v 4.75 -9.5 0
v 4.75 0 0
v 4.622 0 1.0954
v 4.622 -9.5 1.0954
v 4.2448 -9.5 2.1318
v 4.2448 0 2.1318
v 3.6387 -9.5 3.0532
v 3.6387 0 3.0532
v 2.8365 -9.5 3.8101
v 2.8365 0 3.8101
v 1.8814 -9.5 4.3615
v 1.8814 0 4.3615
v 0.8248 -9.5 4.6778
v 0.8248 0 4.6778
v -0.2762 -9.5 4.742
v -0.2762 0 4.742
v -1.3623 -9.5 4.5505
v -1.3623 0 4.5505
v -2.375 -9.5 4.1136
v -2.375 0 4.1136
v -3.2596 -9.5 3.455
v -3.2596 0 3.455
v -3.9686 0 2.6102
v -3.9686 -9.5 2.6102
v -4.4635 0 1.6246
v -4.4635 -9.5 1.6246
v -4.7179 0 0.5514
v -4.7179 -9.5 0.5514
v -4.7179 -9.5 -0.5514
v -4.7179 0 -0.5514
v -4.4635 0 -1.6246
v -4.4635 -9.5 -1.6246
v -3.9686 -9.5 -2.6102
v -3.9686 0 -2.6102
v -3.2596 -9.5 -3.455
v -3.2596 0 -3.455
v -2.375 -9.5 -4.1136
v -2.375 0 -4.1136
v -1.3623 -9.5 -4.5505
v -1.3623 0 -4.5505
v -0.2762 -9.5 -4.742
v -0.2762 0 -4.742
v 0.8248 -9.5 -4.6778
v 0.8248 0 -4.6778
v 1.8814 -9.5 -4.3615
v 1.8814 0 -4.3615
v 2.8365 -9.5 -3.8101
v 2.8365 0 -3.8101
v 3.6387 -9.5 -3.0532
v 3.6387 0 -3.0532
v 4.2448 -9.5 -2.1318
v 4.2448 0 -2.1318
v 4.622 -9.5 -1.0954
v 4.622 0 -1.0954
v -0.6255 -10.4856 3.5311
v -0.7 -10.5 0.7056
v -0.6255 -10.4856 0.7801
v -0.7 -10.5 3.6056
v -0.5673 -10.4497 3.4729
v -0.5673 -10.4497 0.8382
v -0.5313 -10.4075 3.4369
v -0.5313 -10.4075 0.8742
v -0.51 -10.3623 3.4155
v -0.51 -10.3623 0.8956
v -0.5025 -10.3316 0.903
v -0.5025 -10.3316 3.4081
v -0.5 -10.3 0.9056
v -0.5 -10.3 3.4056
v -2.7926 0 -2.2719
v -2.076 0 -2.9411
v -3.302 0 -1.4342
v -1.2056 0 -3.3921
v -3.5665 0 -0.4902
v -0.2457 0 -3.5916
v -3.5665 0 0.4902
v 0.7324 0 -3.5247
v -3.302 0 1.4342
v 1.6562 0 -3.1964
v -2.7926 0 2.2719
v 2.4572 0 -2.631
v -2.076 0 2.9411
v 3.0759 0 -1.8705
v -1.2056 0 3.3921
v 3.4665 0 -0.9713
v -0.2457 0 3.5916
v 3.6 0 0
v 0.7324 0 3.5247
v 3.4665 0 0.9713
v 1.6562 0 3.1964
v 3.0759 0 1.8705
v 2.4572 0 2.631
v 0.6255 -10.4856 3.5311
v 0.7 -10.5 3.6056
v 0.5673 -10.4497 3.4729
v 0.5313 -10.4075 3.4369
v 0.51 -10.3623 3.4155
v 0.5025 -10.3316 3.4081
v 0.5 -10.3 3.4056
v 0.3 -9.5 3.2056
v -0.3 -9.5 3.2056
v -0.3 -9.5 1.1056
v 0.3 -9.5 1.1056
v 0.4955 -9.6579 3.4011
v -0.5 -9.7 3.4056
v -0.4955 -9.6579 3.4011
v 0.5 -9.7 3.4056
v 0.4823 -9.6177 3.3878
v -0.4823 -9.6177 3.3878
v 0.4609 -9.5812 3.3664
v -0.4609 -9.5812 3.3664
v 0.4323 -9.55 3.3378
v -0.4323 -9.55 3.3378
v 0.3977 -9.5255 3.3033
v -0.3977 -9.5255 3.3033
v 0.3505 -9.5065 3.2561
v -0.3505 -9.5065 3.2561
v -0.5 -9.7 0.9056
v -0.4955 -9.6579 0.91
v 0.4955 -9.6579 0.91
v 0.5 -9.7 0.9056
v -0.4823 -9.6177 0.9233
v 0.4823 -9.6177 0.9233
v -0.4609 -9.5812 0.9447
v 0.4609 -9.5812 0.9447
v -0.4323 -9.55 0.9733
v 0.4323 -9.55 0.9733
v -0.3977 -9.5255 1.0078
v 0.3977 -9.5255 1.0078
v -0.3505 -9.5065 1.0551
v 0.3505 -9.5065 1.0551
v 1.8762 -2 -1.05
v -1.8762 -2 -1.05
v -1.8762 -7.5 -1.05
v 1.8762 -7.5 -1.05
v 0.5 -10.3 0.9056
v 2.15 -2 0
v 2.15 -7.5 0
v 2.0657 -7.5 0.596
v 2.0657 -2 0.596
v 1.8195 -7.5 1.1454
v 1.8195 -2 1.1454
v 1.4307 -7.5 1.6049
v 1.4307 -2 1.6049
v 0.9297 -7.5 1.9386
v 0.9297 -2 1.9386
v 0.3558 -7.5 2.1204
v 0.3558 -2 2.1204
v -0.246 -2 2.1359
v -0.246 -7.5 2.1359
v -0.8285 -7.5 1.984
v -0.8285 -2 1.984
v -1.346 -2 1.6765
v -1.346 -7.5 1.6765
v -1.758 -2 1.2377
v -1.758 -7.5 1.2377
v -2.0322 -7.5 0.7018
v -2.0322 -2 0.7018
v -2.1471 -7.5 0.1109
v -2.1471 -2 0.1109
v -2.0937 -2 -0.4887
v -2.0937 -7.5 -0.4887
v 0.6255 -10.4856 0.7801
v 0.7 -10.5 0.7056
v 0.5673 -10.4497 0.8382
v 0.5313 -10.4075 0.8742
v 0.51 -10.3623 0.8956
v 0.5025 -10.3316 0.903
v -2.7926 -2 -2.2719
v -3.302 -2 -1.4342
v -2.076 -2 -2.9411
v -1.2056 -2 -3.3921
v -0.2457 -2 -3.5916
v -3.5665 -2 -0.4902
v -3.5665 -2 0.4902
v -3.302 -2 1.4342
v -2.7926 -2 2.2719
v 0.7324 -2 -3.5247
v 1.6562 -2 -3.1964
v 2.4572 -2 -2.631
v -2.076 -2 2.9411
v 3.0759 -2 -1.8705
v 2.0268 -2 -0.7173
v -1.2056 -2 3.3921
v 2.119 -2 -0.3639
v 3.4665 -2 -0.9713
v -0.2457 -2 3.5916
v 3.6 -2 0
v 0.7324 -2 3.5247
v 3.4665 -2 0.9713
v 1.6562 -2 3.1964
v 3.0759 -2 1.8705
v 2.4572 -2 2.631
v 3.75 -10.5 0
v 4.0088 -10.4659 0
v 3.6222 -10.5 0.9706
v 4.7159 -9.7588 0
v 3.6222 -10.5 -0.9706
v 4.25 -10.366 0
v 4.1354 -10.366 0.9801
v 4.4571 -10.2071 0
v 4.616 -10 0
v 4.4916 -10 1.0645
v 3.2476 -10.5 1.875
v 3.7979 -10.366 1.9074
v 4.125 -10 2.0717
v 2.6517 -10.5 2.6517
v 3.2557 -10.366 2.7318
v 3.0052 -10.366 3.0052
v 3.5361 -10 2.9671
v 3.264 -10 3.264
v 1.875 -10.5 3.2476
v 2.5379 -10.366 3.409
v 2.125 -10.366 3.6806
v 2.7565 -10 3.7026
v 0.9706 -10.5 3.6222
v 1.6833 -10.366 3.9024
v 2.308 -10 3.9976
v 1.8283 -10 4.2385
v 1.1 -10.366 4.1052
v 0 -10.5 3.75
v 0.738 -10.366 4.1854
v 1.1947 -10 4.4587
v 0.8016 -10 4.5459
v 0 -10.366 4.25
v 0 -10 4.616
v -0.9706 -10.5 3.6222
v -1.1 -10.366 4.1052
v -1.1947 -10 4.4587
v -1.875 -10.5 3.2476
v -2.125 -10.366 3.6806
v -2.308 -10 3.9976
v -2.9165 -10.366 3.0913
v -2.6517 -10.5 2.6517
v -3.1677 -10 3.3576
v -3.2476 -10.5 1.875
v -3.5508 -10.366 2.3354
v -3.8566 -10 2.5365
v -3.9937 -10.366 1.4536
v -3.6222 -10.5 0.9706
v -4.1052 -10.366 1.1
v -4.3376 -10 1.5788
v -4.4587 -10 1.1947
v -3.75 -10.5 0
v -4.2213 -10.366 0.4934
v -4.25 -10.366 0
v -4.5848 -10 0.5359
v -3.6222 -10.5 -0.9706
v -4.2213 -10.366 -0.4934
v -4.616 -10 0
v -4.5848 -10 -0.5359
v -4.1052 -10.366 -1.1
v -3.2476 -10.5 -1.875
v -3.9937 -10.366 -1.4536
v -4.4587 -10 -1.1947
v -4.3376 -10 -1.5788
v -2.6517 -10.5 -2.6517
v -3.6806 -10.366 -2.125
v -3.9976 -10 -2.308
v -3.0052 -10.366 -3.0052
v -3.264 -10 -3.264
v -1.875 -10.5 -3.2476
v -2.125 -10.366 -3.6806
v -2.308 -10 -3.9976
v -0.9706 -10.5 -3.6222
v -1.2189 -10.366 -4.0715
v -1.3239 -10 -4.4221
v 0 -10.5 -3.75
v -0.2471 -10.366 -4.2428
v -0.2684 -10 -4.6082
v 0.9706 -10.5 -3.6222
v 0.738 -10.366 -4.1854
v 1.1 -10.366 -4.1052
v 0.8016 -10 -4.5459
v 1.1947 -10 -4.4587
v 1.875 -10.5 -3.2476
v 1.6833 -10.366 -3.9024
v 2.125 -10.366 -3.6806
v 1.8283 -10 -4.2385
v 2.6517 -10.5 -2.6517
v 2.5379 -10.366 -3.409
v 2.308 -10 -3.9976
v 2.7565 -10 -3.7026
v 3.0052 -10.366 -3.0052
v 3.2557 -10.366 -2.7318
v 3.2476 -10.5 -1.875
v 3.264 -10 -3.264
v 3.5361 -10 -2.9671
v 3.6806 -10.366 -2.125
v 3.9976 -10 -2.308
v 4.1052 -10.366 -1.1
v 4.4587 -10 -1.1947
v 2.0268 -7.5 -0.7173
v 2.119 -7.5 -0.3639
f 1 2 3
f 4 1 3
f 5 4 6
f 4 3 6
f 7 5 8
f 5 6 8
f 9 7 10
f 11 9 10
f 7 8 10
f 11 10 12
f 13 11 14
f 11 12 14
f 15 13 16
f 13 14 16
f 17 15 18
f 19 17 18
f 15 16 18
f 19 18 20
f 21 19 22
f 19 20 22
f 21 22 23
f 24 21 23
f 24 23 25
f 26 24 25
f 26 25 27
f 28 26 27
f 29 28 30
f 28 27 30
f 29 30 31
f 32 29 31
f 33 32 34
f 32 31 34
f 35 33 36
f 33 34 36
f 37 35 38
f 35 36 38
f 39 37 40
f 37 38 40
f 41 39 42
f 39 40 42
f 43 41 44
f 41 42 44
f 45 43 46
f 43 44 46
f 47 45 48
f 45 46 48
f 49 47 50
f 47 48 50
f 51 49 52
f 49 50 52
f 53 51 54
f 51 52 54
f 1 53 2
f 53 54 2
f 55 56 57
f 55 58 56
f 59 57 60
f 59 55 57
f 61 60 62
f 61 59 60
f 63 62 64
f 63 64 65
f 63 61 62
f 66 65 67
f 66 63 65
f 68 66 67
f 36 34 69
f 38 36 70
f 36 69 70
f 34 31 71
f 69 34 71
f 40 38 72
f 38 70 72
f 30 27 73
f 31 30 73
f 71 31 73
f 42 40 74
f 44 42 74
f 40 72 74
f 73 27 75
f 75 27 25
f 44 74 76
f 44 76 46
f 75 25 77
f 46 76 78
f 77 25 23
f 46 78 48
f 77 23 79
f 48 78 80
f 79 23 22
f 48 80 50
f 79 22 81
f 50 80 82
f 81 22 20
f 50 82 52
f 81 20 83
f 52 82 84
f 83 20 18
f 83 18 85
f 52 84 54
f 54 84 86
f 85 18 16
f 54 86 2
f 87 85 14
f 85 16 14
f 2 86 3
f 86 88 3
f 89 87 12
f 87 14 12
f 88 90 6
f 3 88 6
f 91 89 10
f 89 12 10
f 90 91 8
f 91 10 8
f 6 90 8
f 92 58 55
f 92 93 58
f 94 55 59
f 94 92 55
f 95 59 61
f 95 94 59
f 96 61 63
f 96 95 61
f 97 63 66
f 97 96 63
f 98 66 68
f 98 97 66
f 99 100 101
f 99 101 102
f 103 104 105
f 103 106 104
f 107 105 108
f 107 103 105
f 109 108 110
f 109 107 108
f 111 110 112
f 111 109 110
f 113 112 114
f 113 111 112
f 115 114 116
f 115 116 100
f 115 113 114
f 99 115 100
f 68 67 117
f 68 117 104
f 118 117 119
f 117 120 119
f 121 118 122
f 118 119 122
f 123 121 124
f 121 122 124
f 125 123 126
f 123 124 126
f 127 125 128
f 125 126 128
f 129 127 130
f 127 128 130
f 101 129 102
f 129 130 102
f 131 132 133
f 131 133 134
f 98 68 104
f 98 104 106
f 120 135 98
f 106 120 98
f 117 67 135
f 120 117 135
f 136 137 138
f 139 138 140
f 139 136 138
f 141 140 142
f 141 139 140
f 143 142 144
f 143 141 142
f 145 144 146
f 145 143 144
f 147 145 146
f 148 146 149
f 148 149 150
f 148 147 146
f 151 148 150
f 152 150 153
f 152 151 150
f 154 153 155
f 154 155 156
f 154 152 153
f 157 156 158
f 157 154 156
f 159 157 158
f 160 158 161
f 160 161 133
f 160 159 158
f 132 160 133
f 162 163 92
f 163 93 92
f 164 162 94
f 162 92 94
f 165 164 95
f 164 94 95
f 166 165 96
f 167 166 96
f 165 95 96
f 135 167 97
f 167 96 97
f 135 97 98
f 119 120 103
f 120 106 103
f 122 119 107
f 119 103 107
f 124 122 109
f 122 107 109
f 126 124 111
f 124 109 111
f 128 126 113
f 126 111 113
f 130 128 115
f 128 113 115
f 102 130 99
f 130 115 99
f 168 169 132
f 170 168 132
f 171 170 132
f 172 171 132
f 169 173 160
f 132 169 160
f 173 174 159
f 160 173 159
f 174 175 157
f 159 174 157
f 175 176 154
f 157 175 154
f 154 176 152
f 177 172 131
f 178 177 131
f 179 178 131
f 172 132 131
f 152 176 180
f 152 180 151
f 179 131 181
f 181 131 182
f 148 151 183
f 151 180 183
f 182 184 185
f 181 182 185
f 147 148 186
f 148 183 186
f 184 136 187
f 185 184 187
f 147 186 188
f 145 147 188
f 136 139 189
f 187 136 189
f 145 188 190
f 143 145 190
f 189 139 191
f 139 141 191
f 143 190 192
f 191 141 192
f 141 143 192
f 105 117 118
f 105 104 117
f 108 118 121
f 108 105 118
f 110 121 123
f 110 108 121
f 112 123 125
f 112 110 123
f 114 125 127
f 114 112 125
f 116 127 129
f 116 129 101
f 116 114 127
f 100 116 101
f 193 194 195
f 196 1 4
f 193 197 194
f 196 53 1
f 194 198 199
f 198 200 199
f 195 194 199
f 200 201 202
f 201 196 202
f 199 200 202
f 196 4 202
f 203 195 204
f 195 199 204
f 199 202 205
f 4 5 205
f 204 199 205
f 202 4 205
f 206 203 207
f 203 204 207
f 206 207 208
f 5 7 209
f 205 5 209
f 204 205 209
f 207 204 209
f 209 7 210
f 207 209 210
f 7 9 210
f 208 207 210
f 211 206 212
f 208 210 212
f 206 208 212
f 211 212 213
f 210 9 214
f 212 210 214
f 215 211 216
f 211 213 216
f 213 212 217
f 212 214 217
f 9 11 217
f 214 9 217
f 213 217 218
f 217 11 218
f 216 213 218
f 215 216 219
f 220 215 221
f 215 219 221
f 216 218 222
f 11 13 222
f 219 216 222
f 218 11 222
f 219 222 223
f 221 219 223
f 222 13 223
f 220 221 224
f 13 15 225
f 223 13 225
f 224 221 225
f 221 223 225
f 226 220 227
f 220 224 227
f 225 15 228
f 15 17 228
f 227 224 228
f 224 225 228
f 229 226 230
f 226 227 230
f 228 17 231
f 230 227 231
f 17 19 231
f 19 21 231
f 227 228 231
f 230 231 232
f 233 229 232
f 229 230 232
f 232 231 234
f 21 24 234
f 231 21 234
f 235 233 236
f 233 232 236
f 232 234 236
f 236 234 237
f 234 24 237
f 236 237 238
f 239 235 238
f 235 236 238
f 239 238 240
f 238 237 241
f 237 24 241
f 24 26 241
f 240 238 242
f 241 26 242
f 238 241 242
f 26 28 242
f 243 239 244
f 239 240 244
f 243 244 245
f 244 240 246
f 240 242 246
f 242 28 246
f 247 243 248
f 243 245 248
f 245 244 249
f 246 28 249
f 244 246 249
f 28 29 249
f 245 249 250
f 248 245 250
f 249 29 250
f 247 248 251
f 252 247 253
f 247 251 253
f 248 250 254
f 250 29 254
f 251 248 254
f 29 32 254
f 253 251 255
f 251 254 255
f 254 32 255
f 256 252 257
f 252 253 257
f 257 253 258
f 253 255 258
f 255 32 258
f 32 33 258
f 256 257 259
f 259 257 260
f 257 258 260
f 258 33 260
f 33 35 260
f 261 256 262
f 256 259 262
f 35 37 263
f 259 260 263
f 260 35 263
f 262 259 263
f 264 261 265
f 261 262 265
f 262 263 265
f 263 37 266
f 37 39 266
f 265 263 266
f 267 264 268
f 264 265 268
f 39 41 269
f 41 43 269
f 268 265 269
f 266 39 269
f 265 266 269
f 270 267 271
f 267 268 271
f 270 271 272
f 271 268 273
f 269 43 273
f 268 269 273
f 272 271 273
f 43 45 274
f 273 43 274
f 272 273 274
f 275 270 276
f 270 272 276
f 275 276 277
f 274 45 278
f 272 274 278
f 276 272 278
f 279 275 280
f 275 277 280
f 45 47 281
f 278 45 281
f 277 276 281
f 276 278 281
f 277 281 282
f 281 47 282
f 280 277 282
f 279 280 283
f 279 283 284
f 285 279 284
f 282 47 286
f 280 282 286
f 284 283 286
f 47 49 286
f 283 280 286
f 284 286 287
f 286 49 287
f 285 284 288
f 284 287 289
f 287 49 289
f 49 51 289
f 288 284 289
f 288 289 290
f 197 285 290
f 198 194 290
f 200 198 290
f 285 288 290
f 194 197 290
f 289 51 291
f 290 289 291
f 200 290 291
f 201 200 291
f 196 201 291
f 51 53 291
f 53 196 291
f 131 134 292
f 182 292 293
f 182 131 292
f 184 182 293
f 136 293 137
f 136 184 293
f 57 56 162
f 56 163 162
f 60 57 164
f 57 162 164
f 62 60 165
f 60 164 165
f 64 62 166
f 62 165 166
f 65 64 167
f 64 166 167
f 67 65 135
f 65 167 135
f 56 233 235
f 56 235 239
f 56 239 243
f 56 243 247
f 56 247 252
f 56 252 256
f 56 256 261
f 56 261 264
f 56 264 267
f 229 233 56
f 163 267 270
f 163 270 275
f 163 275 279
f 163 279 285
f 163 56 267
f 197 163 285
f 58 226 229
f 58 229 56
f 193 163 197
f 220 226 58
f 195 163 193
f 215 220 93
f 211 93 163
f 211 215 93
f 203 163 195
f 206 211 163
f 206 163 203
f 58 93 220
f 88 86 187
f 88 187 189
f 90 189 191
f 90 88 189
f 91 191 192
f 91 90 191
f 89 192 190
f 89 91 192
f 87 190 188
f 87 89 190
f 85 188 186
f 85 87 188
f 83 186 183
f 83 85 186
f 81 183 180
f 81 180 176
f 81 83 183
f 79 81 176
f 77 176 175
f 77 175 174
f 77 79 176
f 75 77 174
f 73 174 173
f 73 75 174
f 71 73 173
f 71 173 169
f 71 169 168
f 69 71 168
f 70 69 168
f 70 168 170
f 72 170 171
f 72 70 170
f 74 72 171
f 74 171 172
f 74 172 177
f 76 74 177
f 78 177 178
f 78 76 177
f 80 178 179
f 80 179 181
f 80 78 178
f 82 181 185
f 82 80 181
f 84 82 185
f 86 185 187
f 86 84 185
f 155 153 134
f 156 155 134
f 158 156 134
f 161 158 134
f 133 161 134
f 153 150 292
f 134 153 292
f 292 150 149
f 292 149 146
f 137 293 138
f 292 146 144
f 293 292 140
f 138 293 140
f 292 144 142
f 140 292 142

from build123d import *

# Parameters (mm, degrees)
F0_R     = 4.75
F0_R_2   = 3.6
F1_DEPTH = 10.5
F2_DEPTH = 2
F3_DEPTH = 7.5
F4_W     = 1
F4_H     = 2.5
F5_DEPTH = 1
F6_R     = 0.2
F7_R     = 1


with BuildPart() as f1:
    # F0 (on Front) → F1 (new body)
    with BuildSketch(Plane.XZ):
        Circle(F0_R)
        Circle(F0_R_2, mode=Mode.SUBTRACT)
        Circle(F0_R_2)
        with BuildLine():
            ThreePointArc((-1.8761663039, -1.05), (-0.5425598799, 2.0804155298), (2.15, 0))
            ThreePointArc((2.15, 0), (2.0804155298, -0.5425598799), (1.8761663039, -1.05))
            ThreePointArc((1.8761663039, -1.05), (0, -2.15), (-1.8761663039, -1.05))
        make_face(mode=Mode.SUBTRACT)
        with BuildLine():
            ThreePointArc((1.8761663039, -1.05), (2.0804155298, -0.5425598799), (2.15, 0))
            ThreePointArc((2.15, 0), (-0.5425598799, 2.0804155298), (-1.8761663039, -1.05))
            Line((-1.8761663039, -1.05), (1.8761663039, -1.05))
        make_face()
        with BuildLine():
            Line((1.8761663039, -1.05), (-1.8761663039, -1.05))
            ThreePointArc((-1.8761663039, -1.05), (0, -2.15), (1.8761663039, -1.05))
        make_face()
    extrude(amount=F1_DEPTH)

    # F0 (on Front) → F2 (cut)
    with BuildSketch(Plane.XZ):
        Circle(F0_R_2)
        with BuildLine():
            ThreePointArc((-1.8761663039, -1.05), (-0.5425598799, 2.0804155298), (2.15, 0))
            ThreePointArc((2.15, 0), (2.0804155298, -0.5425598799), (1.8761663039, -1.05))
            ThreePointArc((1.8761663039, -1.05), (0, -2.15), (-1.8761663039, -1.05))
        make_face(mode=Mode.SUBTRACT)
        with BuildLine():
            ThreePointArc((1.8761663039, -1.05), (2.0804155298, -0.5425598799), (2.15, 0))
            ThreePointArc((2.15, 0), (-0.5425598799, 2.0804155298), (-1.8761663039, -1.05))
            Line((-1.8761663039, -1.05), (1.8761663039, -1.05))
        make_face()
        with BuildLine():
            Line((1.8761663039, -1.05), (-1.8761663039, -1.05))
            ThreePointArc((-1.8761663039, -1.05), (0, -2.15), (1.8761663039, -1.05))
        make_face()
    extrude(amount=F2_DEPTH, mode=Mode.SUBTRACT)

    # F0 (on Front) → F3 (cut)
    with BuildSketch(Plane.XZ):
        with BuildLine():
            ThreePointArc((1.8761663039, -1.05), (2.0804155298, -0.5425598799), (2.15, 0))
            ThreePointArc((2.15, 0), (-0.5425598799, 2.0804155298), (-1.8761663039, -1.05))
            Line((-1.8761663039, -1.05), (1.8761663039, -1.05))
        make_face()
    extrude(amount=F3_DEPTH, mode=Mode.SUBTRACT)

    # F4 (on face) → F5 (cut)
    with BuildSketch(Plane.XZ.offset(10.5)):
        with Locations((0, 2.1555542984)):
            Rectangle(F4_W, F4_H)
    extrude(amount=-F5_DEPTH, mode=Mode.SUBTRACT)

    # F6
    f6_edges = [f1.edges().sort_by_distance(p)[0] for p in [
        (-0.5, -10.5, 2.155554),
        (0, -10.5, 3.405554),
        (0.5, -10.5, 2.155554),
        (0, -10.5, 0.905554),
        (0, -9.5, 3.405554),
        (0.5, -9.5, 2.155554),
        (-0.5, -9.5, 2.155554),
        (0, -9.5, 0.905554),
    ]]
    fillet(f6_edges, radius=F6_R)

    # F7
    f7_edges = [f1.edges().sort_by_distance(p)[0] for p in [
        (-4.75, -10.5, 0),
    ]]
    fillet(f7_edges, radius=F7_R)


solid = f1.part
